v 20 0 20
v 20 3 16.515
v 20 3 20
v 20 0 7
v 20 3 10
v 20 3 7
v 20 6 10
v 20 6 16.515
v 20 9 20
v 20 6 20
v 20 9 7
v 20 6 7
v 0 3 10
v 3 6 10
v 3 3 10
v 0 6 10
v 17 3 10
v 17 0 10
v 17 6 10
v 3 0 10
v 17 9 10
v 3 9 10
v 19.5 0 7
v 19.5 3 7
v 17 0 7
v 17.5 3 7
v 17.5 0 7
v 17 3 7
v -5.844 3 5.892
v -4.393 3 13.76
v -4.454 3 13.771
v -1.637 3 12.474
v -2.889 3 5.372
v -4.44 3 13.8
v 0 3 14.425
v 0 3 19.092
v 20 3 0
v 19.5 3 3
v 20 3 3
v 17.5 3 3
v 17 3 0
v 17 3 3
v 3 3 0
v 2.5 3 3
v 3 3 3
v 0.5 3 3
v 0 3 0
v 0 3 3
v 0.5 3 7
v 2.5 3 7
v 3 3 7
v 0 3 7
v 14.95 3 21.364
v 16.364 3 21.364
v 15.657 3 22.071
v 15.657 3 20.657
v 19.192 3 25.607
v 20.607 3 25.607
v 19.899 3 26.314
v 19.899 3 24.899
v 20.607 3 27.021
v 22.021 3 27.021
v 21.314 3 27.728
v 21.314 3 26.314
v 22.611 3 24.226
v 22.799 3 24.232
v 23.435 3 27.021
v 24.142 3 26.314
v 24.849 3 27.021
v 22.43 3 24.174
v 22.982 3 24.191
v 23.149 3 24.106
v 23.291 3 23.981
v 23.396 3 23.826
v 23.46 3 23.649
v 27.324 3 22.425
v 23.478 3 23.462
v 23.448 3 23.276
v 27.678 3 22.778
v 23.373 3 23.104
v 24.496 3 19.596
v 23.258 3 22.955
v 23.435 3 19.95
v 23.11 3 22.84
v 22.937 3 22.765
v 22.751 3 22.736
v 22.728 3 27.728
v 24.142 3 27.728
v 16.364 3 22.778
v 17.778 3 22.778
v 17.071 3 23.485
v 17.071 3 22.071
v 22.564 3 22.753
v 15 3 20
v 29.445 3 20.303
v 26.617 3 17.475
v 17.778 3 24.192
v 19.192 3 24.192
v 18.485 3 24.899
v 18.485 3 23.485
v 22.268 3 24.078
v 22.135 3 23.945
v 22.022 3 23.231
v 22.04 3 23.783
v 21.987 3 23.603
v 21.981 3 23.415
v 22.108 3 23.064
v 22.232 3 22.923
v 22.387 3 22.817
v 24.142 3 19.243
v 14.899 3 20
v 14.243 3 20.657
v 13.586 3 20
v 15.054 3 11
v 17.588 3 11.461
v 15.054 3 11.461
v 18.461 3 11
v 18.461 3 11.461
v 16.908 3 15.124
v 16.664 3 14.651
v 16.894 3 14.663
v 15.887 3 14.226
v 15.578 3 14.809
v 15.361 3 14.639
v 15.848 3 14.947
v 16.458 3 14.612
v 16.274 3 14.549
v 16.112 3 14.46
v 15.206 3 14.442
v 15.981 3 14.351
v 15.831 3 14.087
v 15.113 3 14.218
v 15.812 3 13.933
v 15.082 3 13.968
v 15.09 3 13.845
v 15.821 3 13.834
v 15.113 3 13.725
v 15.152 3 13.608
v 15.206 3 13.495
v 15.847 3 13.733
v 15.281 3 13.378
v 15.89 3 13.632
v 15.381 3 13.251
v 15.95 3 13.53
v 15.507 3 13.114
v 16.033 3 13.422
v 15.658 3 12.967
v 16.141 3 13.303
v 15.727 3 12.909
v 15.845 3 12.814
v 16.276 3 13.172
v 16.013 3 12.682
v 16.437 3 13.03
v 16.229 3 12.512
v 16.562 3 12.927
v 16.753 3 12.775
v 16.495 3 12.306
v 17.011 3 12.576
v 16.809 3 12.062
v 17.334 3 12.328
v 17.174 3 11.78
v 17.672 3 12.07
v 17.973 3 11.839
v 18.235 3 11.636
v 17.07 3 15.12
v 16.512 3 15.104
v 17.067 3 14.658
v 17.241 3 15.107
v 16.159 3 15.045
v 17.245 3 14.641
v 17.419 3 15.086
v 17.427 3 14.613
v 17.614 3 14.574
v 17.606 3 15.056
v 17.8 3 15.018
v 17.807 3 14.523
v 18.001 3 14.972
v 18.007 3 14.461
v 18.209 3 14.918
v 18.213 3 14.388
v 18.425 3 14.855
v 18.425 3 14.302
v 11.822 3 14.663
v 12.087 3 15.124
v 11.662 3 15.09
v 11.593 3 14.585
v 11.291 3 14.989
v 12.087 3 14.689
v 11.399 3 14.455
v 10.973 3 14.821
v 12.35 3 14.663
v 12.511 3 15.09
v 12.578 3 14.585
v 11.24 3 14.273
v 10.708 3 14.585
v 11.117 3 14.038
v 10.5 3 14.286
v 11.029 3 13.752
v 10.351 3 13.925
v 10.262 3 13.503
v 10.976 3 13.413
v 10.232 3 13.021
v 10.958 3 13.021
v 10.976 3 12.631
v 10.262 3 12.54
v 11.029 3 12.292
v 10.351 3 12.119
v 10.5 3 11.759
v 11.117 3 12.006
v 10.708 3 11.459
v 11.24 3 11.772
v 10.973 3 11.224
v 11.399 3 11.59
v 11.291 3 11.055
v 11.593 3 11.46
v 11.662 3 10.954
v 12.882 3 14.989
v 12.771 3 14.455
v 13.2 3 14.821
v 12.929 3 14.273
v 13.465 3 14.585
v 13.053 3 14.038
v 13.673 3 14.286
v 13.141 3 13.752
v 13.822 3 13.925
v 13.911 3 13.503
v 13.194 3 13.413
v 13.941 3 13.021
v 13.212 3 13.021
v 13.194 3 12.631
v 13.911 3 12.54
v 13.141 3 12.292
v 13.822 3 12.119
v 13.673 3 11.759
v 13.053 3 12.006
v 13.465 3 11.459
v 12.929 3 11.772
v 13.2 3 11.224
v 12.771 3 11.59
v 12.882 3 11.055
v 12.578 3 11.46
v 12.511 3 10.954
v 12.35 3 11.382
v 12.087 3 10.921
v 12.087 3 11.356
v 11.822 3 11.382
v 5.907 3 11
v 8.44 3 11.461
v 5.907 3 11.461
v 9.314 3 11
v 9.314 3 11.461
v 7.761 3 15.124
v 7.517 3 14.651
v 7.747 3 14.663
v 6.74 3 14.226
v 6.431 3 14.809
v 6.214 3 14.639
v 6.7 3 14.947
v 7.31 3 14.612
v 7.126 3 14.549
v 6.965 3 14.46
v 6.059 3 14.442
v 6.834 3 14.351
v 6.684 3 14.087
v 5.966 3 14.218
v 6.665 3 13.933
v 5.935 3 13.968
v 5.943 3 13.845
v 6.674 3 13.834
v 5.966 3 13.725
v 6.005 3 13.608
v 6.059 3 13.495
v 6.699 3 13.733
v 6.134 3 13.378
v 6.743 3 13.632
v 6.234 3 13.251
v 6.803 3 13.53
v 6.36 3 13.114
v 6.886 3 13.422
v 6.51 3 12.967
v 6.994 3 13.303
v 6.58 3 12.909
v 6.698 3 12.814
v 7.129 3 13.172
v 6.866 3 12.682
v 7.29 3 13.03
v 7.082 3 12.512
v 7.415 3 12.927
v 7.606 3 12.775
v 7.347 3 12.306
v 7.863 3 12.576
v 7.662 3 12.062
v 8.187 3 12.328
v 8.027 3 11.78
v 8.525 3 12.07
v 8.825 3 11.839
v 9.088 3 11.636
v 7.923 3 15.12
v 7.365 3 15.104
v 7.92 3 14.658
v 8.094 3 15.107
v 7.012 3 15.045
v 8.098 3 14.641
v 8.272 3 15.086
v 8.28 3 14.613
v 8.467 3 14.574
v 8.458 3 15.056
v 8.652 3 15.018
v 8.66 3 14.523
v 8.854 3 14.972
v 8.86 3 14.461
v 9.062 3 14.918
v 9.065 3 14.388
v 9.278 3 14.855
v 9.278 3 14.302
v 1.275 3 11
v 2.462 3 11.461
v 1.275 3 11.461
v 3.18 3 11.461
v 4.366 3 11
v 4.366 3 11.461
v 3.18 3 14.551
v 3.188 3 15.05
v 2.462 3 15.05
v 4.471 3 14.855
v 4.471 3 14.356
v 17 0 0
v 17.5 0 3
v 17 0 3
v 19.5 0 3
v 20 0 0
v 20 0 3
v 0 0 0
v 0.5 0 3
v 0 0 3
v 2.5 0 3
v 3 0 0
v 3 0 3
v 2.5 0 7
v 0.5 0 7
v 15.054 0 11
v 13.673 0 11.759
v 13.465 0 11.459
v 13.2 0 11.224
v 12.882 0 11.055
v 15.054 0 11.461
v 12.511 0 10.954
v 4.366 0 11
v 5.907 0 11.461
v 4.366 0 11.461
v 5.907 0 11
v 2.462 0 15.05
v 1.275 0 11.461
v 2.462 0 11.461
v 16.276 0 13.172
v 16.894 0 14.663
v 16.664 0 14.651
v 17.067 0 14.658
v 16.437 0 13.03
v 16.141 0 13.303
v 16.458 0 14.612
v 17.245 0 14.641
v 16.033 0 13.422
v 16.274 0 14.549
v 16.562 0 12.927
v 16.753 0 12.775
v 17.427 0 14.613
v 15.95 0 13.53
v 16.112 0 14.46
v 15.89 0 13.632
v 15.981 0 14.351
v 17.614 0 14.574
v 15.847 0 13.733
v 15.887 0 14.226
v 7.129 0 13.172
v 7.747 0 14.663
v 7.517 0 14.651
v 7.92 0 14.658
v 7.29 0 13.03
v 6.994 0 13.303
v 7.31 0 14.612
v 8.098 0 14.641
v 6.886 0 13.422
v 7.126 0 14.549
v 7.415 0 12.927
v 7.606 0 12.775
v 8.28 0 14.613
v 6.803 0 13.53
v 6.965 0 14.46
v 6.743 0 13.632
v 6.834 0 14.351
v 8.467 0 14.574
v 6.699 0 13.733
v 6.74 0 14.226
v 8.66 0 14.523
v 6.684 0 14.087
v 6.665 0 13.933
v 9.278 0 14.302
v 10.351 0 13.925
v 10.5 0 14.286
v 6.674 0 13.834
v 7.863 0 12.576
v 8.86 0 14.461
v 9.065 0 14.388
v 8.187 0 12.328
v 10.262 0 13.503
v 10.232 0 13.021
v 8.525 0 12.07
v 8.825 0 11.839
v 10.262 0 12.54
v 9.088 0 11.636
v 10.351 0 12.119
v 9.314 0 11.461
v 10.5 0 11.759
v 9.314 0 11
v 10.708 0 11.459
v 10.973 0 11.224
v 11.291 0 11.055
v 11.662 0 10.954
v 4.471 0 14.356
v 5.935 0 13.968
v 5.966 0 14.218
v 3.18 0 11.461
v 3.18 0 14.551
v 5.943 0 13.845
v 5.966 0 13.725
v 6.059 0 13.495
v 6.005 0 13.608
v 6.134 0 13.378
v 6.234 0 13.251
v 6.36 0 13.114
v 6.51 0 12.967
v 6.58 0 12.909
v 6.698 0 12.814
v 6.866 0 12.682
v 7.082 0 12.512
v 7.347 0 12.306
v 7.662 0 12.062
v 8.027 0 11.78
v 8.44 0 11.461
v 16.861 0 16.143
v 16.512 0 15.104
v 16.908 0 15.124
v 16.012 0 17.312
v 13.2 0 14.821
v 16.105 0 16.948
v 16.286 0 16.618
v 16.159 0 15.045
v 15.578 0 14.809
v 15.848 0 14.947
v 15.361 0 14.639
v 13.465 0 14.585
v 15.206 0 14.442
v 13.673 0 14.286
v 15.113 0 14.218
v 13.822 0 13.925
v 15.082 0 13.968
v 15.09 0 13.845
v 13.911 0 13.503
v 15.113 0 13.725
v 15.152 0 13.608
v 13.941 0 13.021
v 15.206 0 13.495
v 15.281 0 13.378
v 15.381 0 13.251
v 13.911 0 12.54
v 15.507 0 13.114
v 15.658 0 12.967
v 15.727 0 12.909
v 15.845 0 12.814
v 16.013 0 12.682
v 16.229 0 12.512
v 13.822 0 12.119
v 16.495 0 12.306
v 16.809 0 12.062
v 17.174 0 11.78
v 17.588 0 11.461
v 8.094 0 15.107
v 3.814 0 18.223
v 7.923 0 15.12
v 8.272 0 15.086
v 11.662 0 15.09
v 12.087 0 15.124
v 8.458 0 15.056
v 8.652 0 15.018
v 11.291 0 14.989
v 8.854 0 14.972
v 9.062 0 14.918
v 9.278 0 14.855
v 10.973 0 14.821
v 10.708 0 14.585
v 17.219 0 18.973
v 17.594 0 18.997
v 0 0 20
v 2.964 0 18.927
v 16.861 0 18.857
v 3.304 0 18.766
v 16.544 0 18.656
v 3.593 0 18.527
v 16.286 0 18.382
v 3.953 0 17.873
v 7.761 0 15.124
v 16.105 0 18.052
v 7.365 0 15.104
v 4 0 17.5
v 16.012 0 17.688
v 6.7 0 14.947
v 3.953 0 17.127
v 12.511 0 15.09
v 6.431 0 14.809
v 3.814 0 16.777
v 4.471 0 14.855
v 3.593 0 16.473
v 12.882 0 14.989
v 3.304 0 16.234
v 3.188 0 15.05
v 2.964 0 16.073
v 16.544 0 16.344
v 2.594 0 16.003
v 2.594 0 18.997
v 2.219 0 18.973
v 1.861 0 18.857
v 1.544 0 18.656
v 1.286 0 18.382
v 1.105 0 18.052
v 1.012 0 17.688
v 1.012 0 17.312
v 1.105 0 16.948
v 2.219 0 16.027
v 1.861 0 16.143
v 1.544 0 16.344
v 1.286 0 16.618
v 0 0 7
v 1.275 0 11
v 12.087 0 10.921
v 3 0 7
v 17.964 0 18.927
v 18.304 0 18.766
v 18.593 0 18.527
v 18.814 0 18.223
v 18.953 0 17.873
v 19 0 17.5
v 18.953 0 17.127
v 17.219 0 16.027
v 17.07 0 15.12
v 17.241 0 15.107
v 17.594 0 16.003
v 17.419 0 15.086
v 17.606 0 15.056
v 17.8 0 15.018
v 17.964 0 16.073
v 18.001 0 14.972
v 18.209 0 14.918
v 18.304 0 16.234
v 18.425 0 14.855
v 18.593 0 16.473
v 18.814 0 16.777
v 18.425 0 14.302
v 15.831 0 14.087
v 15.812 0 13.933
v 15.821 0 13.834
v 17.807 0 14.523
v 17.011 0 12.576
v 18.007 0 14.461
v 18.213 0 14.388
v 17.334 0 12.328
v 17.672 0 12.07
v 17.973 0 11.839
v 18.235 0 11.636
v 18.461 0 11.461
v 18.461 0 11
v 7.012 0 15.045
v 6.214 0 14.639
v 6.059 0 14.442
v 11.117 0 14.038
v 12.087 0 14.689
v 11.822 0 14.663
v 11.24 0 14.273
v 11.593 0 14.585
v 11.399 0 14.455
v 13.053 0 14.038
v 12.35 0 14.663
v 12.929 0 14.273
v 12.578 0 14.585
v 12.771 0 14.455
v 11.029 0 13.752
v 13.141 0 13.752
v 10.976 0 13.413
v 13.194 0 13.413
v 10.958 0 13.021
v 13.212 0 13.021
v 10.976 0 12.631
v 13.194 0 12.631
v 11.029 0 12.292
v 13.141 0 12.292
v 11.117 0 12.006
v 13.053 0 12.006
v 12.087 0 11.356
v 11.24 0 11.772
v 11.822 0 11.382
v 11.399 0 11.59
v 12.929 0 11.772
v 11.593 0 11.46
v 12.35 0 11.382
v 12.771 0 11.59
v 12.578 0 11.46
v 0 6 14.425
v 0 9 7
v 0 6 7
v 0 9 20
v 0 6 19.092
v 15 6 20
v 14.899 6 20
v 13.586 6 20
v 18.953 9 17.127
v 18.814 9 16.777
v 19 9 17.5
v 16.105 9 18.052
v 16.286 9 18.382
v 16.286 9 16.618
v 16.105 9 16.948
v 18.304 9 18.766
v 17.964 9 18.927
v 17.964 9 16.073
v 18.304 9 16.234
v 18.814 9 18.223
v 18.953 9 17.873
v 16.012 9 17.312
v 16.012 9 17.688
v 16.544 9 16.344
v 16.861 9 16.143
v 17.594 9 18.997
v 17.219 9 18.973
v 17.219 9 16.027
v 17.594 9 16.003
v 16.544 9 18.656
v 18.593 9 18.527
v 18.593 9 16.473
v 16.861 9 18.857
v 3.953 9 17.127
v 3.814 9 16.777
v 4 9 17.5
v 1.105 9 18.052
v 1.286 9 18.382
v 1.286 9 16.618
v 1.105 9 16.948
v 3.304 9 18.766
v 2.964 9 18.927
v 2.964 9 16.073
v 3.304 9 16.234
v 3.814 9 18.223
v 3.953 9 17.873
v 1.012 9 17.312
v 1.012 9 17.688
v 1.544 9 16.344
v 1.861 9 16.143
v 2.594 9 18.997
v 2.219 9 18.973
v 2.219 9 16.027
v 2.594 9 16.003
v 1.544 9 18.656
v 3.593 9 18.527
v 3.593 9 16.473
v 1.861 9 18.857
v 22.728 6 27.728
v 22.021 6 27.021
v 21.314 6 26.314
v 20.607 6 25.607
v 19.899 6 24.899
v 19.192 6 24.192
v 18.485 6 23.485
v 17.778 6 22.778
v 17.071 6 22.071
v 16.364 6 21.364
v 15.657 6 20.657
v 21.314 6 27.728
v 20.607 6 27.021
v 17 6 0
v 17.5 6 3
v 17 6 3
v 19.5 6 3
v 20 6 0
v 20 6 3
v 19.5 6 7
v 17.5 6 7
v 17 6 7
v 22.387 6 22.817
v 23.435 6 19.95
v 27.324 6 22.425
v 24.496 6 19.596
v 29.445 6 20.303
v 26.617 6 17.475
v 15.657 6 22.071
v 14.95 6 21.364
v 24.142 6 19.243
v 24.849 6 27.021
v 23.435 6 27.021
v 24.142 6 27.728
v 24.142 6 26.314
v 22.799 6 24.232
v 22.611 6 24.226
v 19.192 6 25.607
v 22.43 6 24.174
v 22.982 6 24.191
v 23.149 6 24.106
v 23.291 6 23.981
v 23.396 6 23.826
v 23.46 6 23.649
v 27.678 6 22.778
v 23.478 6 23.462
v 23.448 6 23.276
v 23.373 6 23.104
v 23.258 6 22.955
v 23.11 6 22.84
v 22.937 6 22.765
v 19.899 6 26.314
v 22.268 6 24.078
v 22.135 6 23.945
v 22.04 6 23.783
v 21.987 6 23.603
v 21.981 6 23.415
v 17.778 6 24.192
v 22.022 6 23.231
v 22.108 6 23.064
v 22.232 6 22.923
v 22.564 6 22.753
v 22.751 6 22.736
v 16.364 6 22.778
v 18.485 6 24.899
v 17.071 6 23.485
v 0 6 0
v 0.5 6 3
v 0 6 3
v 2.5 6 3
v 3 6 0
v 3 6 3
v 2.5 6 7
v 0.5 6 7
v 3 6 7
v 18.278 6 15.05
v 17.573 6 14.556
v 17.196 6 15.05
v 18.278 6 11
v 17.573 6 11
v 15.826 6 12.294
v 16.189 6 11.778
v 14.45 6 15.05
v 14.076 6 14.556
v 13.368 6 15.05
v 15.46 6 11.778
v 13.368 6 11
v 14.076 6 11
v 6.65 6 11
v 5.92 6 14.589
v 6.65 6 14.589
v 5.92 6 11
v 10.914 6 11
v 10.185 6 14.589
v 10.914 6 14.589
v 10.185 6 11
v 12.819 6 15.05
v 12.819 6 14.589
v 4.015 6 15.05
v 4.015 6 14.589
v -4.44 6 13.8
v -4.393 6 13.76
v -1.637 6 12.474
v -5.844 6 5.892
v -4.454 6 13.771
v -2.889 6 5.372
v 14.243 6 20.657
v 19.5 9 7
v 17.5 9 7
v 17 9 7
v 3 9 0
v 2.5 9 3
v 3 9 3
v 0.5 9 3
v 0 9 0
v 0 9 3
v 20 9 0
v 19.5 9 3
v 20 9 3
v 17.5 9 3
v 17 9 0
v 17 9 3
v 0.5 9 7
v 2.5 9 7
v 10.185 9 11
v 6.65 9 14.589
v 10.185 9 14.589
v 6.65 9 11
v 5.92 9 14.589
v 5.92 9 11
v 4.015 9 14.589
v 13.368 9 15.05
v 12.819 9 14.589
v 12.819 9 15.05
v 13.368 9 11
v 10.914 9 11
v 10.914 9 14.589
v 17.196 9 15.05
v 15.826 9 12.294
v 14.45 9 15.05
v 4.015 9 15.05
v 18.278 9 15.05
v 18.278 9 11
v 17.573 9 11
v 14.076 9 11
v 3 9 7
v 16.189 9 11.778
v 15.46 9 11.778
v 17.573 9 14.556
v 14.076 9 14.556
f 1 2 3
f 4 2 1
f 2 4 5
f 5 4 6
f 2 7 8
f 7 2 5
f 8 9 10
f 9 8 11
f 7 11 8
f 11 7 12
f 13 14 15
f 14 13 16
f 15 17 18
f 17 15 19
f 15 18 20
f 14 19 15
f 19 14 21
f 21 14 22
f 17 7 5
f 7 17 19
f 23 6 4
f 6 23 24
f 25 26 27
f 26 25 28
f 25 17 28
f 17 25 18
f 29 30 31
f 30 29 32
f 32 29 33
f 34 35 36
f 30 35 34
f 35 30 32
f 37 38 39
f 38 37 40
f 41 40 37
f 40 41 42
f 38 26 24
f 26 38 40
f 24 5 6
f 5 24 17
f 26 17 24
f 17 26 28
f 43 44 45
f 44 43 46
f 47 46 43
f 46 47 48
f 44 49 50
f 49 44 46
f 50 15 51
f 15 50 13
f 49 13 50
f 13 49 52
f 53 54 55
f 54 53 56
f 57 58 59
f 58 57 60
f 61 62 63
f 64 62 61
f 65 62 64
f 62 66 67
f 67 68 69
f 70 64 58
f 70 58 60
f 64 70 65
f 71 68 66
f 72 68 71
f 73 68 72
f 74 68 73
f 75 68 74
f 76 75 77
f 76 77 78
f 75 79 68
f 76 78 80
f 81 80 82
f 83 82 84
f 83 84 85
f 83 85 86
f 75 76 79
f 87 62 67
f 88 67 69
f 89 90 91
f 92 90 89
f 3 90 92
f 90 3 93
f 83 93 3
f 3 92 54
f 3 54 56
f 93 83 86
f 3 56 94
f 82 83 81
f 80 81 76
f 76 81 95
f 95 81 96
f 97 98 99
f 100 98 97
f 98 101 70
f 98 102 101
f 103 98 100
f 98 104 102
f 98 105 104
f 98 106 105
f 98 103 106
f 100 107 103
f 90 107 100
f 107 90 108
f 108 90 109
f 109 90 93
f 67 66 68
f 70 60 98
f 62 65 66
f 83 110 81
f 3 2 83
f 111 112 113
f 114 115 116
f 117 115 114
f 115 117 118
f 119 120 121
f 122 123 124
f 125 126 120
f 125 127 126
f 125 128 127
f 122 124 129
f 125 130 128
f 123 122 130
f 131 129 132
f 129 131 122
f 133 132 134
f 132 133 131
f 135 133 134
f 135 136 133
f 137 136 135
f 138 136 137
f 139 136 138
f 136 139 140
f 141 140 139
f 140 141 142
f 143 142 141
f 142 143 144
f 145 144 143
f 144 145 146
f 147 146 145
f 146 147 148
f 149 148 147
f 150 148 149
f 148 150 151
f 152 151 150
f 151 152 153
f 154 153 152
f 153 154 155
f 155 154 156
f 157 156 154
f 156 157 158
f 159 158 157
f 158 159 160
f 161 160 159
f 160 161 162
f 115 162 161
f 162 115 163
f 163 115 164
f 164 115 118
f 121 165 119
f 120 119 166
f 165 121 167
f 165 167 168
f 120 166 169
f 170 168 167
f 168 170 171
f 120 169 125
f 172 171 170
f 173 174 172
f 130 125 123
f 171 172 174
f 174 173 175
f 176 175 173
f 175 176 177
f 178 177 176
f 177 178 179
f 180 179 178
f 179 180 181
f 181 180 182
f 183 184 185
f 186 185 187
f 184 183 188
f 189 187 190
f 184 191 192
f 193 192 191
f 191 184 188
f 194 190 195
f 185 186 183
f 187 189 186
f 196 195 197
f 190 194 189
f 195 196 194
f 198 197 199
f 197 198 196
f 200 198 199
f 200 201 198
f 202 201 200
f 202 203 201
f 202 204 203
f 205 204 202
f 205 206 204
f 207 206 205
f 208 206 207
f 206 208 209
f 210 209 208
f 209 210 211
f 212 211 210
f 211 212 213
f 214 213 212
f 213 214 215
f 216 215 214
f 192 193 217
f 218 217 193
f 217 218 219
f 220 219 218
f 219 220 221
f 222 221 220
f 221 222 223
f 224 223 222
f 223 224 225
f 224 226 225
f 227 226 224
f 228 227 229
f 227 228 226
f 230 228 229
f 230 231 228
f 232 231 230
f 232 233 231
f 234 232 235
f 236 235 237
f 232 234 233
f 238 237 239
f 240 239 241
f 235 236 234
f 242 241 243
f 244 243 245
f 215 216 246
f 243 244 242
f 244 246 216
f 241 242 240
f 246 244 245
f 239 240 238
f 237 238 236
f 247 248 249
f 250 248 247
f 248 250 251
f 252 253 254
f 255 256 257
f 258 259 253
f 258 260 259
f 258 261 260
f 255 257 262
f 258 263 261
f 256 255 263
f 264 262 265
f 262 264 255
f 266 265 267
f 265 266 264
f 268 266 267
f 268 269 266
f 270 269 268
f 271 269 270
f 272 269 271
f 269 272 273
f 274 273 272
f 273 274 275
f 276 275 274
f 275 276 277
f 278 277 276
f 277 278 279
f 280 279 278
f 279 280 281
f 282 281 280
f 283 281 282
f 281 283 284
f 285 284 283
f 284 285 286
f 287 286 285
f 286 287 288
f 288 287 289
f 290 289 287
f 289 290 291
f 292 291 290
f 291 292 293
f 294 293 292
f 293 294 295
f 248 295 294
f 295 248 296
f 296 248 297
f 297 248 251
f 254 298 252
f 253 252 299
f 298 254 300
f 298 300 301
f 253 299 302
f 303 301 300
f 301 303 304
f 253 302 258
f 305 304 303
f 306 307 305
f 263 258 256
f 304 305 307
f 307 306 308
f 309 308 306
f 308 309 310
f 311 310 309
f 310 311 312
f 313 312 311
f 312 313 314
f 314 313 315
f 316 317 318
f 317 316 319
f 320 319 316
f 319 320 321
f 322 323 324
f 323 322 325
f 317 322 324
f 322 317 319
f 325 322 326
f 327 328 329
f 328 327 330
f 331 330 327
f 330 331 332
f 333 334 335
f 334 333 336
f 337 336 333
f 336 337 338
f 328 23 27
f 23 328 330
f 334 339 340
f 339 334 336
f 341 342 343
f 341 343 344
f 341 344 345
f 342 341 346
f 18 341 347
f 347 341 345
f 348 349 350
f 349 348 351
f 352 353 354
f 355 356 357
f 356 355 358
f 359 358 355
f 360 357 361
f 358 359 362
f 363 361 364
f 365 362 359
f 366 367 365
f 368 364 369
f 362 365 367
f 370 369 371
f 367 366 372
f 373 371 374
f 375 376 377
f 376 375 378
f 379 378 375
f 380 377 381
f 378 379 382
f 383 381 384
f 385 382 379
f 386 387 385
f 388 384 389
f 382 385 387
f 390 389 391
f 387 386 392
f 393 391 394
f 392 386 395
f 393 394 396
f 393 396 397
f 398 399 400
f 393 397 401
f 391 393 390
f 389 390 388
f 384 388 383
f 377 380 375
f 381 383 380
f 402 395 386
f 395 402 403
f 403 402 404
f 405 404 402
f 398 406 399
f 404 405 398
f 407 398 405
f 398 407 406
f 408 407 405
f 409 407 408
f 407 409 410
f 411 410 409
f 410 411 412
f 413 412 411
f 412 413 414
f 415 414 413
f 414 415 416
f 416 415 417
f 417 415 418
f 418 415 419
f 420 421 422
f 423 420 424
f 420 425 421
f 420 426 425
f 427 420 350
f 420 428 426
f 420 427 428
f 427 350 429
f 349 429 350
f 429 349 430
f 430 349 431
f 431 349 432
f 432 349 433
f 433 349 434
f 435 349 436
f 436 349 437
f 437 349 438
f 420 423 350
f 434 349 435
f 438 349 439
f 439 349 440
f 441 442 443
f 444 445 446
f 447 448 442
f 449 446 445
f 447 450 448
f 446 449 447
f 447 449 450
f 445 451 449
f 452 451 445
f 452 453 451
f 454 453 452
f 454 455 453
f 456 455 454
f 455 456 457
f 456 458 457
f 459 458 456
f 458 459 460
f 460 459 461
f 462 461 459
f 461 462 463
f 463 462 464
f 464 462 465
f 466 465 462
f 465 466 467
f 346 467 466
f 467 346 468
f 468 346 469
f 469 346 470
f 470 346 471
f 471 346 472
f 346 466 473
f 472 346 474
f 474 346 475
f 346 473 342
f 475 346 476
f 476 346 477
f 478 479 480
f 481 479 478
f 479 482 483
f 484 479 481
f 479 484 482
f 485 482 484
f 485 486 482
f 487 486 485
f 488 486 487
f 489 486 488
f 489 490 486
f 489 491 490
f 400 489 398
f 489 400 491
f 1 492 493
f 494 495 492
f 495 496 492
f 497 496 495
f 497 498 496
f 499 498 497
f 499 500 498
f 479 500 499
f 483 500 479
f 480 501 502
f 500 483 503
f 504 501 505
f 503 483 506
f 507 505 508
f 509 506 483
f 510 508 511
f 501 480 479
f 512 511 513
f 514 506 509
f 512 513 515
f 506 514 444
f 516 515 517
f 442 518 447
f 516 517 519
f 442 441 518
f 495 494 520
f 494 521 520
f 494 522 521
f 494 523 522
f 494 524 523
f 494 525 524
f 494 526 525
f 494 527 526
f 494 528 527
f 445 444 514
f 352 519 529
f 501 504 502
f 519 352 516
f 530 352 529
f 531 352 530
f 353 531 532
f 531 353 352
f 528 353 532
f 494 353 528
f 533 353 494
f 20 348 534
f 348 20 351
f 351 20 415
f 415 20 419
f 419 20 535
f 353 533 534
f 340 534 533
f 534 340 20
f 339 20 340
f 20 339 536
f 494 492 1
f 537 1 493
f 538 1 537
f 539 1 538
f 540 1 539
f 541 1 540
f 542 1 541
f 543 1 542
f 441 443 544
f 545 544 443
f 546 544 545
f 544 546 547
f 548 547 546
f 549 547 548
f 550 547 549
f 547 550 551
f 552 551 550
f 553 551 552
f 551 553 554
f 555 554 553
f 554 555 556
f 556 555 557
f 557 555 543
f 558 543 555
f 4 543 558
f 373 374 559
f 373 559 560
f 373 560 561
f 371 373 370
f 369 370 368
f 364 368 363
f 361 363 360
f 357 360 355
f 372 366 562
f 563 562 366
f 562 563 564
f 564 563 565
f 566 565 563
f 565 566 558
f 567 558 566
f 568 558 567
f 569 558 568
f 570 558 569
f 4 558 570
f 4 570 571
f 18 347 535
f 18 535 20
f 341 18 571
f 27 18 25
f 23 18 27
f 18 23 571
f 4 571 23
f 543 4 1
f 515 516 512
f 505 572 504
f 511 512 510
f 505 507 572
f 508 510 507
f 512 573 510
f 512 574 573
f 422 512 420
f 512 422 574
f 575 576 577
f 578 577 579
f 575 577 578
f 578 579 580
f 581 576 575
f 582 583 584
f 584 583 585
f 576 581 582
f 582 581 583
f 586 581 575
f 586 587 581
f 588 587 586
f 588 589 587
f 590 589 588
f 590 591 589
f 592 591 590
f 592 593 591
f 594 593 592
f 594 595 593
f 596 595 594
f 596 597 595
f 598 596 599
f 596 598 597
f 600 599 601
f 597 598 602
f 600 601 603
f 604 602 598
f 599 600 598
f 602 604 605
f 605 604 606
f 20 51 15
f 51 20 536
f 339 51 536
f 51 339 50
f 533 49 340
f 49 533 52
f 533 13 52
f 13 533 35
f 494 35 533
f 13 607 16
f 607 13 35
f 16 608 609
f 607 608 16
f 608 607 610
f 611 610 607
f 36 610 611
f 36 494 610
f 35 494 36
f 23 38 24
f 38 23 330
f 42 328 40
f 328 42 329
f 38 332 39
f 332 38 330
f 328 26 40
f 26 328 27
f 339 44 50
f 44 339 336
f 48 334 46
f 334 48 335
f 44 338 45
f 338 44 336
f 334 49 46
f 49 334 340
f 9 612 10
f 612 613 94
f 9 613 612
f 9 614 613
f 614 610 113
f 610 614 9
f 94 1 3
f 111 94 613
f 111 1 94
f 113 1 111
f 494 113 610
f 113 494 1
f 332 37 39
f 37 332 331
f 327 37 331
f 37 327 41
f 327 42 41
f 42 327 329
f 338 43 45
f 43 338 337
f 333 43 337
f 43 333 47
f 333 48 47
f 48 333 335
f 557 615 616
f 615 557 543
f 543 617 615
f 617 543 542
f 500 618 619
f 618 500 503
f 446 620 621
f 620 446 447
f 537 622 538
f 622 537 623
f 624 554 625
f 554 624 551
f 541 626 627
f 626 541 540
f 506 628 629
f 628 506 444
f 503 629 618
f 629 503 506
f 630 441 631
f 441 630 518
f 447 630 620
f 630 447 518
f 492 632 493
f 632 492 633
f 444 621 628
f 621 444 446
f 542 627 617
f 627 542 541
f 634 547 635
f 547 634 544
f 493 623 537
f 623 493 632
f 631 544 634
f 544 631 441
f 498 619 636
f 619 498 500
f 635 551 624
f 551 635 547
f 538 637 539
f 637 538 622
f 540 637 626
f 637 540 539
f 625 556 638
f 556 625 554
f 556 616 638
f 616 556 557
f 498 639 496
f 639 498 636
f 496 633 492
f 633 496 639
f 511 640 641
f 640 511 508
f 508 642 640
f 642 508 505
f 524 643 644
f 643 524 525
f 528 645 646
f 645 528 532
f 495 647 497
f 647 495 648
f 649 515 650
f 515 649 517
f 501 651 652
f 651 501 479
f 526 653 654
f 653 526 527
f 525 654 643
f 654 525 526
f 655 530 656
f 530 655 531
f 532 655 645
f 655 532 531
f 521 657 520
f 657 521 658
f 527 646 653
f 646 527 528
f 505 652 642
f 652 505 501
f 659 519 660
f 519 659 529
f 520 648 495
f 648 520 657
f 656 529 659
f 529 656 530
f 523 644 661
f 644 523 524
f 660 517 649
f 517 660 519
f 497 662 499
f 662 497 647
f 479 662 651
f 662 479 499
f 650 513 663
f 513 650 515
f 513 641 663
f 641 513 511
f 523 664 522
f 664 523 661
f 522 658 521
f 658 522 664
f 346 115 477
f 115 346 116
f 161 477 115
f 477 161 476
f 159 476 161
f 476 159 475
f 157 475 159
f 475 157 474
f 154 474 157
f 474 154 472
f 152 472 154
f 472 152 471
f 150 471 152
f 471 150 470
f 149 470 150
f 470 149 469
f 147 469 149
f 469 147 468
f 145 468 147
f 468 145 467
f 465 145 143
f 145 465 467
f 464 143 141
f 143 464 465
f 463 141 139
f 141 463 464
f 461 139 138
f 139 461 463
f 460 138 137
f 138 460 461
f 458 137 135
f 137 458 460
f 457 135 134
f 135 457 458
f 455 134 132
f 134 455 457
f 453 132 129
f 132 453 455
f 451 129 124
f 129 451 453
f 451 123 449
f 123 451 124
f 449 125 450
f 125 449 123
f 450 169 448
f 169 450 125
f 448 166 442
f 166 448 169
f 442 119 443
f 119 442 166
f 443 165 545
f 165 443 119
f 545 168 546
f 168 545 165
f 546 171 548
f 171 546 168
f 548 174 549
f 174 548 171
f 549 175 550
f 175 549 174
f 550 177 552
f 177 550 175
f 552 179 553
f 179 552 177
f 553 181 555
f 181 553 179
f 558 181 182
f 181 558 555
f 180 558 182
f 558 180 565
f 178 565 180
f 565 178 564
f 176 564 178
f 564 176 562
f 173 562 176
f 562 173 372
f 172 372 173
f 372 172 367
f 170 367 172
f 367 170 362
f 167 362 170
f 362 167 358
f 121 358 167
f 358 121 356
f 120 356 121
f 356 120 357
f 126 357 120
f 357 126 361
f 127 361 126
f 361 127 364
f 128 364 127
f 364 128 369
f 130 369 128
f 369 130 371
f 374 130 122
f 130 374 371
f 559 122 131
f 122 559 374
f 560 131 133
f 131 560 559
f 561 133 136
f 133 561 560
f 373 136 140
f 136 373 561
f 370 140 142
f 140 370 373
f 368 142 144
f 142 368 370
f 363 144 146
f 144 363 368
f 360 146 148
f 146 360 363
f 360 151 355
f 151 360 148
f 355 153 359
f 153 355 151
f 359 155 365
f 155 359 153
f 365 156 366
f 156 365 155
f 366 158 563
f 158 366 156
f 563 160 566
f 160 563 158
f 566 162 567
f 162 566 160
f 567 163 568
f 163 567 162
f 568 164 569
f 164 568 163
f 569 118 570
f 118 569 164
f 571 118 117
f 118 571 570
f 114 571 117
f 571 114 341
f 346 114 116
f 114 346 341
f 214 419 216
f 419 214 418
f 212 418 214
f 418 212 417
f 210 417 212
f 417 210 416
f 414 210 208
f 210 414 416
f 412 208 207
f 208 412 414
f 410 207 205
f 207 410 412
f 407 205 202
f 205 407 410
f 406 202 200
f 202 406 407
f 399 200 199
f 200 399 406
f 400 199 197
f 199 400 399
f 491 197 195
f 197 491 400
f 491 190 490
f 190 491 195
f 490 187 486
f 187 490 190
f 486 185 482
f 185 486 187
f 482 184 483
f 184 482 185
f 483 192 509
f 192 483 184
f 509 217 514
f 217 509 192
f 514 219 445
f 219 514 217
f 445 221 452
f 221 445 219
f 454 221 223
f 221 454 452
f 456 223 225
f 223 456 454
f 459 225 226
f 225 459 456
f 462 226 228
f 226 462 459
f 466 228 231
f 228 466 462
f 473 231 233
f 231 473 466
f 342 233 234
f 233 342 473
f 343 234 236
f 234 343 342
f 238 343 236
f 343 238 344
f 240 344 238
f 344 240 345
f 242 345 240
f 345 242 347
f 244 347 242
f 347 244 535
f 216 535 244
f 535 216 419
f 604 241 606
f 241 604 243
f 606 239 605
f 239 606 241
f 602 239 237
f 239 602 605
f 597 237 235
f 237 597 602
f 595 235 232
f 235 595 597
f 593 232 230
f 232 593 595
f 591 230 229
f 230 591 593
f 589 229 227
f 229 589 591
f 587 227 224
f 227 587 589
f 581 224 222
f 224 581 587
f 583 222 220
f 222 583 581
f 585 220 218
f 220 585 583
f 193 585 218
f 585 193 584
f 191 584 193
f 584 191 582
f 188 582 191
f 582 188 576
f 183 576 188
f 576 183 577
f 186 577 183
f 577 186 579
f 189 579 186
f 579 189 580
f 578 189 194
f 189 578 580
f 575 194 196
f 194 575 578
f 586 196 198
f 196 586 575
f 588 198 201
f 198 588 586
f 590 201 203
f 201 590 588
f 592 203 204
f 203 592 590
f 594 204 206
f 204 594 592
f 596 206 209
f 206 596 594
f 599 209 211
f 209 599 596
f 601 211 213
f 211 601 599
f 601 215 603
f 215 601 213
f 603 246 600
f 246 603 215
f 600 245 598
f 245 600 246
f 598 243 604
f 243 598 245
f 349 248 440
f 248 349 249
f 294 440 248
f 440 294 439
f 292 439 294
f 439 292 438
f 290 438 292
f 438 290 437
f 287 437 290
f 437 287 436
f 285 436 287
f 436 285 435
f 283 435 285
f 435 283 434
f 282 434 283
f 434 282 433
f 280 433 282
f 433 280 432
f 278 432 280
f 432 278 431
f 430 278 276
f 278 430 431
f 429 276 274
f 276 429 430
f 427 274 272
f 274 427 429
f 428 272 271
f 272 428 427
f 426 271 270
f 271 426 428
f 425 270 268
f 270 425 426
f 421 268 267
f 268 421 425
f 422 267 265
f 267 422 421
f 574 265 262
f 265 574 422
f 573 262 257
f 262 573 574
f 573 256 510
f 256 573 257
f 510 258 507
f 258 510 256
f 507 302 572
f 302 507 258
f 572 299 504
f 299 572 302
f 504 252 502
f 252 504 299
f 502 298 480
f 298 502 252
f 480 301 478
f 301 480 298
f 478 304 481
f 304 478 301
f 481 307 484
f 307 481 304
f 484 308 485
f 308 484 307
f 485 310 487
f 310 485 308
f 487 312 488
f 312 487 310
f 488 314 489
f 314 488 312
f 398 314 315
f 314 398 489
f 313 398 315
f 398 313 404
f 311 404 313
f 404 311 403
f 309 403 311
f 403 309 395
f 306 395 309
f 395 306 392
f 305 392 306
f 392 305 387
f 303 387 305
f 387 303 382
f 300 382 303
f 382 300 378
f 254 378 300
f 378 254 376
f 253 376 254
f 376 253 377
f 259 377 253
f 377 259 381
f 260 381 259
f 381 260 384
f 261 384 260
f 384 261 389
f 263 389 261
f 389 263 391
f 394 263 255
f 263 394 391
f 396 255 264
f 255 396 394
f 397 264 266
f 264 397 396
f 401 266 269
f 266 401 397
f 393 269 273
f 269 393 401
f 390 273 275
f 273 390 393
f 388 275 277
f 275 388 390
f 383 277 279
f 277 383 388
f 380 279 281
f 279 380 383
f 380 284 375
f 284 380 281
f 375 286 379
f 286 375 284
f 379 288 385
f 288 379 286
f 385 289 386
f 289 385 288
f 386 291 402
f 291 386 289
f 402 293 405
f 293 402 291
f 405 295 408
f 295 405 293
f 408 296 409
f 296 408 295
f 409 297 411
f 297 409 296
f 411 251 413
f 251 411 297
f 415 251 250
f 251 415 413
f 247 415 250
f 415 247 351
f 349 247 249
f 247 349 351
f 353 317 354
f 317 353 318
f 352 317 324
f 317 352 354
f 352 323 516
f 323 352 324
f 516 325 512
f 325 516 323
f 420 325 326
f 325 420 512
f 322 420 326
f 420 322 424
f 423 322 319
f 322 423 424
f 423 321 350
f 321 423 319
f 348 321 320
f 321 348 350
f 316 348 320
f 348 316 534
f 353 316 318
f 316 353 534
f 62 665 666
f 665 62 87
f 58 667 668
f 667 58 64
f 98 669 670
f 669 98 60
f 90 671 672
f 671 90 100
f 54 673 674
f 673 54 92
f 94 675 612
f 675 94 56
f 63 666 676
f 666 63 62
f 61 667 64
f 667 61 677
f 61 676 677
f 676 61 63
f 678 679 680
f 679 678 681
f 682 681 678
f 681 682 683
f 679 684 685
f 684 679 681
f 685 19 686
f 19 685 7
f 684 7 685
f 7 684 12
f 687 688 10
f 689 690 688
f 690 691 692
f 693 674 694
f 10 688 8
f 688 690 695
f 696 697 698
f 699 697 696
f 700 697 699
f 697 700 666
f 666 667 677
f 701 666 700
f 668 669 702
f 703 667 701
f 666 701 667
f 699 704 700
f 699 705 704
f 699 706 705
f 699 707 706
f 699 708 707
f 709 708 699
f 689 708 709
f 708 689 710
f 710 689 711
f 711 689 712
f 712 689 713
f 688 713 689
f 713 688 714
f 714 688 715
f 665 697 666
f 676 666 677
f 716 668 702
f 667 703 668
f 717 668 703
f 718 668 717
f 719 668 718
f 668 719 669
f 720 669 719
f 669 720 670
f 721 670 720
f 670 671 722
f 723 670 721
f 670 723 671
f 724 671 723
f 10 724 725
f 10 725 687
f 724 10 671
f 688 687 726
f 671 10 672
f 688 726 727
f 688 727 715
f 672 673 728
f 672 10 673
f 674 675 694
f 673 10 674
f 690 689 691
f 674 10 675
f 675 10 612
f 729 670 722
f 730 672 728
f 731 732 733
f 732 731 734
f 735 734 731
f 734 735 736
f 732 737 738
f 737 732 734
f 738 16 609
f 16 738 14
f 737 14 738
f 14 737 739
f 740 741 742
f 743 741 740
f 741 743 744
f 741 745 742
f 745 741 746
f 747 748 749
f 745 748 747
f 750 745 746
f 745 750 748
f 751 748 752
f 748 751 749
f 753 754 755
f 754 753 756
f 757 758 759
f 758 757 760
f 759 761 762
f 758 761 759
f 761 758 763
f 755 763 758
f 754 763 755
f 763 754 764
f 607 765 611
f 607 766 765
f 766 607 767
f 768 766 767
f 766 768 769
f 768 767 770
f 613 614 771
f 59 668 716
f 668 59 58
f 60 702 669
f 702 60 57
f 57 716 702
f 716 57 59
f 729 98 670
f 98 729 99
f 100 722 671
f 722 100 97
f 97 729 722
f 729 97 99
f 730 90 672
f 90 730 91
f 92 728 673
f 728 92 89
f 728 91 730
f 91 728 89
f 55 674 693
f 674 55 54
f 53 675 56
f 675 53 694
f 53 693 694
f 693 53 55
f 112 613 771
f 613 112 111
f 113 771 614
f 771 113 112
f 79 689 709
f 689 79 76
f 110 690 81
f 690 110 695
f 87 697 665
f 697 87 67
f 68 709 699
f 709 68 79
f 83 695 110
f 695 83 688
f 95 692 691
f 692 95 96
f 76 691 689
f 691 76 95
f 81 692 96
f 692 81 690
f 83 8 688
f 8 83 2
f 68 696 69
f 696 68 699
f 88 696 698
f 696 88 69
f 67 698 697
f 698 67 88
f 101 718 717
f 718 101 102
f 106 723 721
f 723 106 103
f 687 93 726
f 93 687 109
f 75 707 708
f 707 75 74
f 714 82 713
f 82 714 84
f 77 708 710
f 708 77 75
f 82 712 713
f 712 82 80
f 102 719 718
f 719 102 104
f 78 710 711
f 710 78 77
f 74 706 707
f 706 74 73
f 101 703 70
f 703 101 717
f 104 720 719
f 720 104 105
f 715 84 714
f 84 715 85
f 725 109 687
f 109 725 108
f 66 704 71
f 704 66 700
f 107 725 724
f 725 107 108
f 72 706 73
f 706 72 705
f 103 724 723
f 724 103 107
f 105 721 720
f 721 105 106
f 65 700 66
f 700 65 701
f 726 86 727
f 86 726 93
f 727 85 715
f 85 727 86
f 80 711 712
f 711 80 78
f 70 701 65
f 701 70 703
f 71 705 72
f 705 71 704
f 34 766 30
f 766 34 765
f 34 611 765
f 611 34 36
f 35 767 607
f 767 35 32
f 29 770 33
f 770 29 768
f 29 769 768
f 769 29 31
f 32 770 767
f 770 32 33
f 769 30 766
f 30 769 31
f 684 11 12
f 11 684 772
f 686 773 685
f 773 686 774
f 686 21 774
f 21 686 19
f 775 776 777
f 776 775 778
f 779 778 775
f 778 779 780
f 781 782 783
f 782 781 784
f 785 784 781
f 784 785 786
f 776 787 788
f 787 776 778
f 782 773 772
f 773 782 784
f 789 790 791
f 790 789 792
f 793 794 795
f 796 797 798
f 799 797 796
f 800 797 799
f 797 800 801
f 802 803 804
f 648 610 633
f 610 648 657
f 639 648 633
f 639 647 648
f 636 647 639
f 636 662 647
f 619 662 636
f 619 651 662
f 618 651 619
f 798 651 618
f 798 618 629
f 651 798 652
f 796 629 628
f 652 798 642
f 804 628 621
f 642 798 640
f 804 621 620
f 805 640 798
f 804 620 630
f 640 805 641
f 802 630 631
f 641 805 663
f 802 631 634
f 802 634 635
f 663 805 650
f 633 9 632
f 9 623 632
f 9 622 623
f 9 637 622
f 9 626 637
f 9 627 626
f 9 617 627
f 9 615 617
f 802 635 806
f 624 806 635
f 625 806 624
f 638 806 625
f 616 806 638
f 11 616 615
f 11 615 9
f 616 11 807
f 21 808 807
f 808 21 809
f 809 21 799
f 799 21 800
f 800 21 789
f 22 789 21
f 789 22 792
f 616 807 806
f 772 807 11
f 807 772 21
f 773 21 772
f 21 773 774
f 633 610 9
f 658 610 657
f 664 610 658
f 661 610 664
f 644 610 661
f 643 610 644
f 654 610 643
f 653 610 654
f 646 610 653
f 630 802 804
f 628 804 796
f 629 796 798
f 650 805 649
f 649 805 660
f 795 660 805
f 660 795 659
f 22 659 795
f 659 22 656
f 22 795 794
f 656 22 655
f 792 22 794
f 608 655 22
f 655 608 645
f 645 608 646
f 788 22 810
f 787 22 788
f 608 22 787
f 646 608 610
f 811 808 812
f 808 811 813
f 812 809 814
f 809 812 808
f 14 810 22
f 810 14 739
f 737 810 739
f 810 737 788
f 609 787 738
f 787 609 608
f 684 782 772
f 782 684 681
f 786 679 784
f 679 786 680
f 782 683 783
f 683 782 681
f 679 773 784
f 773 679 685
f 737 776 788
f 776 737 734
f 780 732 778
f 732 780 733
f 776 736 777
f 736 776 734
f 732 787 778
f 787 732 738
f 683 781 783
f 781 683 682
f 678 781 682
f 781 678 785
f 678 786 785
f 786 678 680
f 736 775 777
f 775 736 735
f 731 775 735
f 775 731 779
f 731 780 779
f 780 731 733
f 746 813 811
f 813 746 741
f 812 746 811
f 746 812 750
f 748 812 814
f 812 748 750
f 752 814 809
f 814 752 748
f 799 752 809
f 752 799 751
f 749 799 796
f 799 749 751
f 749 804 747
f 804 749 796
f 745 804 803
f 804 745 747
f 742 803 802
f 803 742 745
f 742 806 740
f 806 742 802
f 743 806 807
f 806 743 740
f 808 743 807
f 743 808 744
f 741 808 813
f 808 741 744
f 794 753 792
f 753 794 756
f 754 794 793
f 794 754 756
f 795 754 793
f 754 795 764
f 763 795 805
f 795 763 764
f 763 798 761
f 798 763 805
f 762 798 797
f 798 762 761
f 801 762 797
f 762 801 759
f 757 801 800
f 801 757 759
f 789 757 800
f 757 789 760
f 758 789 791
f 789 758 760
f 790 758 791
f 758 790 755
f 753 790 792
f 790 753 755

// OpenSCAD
// file: ../gospel.scad
/**
 * GOSPEL: George's OpenSCAD Procedural Enhancement Library
 * @author glaza
 *
 * Index:
 *      Translation: x, y, z, xy, xz, yz, xyz (displacement, variation)
 *      Scaling:     sx, sy, sz, sxy, sxz, syz, s (factor, variation)
 *      Rotation:    rx, ry, rz (angle, variation)
 *      Duplication: dx, dy, dz ()
 */

/**
 * Translates the children in the X,Y,Z direction
 * @param d Displacement in X,Y,Z direction
 * @param variation The random variation + or - added to the displacement * 
 *  x      Translate X
 *  y      Translate Y
 *  z      Translate Z
 *  xy     Translate equaly in X and Y
 *  xz     Translate equaly in X and Z
 *  yz     Translate equaly in Y and Z
 *  xyz    Translate equaly in X, Y and Z
 */
function rand(value, variation=0) = value + rands(-variation,variation,1)[0]; 
 
module x(dx, variation=0) 
{   
    vx = rands(-variation,variation,1)[0];
    translate([dx+vx,0,0])
    children();
}
module y(dy, variation=0) 
{   
    vy = rands(-variation,variation,1)[0];
    translate([0,dy+vy,0])
    children();
} 
module z(dz, variation=0) 
{   
    vz = rands(-variation,variation,1)[0];
    translate([0,0,dz+vz])
    children();
}
module xy(d, variation=0) 
{   
    x(d, variation)
    y(d, variation)
    children();
}
module yz(d, variation=0) 
{   
    z(d, variation)
    y(d, variation)
    children();
}
module xz(d, variation=0) 
{   
    x(d, variation)
    z(d, variation)
    children();
}
module xyz(d, variation=0) 
{   
    xy(d, variation)
    z(d, variation)
    children();
}

/**
 * Rotates the children around the X axis
 * @param angle Degrees to rotate around the X axis
 * @param variation The random variation + or - added
 *  rx     Rotate around X
 *  ry     Rotate around Y
 *  rz     Rotate around Z
 */
module rx(angle, variation=0) 
{   
    v = rands(-variation,variation,1)[0];
    rotate([angle+v,0,0])
    children();
}
module ry(angle, variation=0) 
{   
    v = rands(-variation,variation,1)[0];
    rotate([0,angle+v,0])
    children();
}
module rz(angle, variation=0) 
{   
    v = rands(-variation,variation,1)[0];
    rotate([0,0,angle+v])
    children();
}

/**
 * Duplicates the children across the different planes.
 *      dx: YZ plane, dy: XZ plane, dz: XY plane
 */
module dx() 
{
    mirror([1,0,0])
    children();

    children();
}
module dy() 
{
    mirror([0,1,0])
    children();

    children();
}
module dz() 
{
    mirror([0,0,1])
    children();

    children();
}

/**
 * Mirrors across diferent planes.
 *      mx: YZ plane, my: XZ plane, mz: XY plane
 */
module mx() 
{
    mirror([1,0,0])
    children();
}
module my() 
{
    mirror([0,1,0])
    children();
}
module mz() 
{
    mirror([0,0,1])
    children();
}

/**
 * Scales in different directions
 *      mx: YZ plane, my: XZ plane, mz: XY plane
 */
module sx(factor, variation=0) 
{
    scaleFactor = rand(factor, variation);
    scale([scaleFactor,1,1])
    children();
}
module sy(factor, variation=0) 
{
    scaleFactor = rand(factor, variation);
    scale([1,scaleFactor,1])
    children();
}
module sz(factor, variation=0) 
{
    scaleFactor = rand(factor, variation);
    scale([1,1,scaleFactor])
    children();
}
module sxy(factor, variation=0) 
{
    sx(factor, variation)
    sy(factor, variation)
    children();
}
module syz(factor, variation=0) 
{
    sz(factor, variation)
    sy(factor, variation)
    children();
}
module sxz(factor, variation=0) 
{   
    sx(factor, variation)
    sz(factor, variation)
    children();
}
module s(factor, variation=0) 
{   
    sxy(factor, variation)
    sz(factor, variation)
    children();
}

/**
 * Shortcuts
 */
module diff() //does not work
{
    difference()
    {
        children();
    }
}


/**
 * Colours
 */
module red()
{
    color("Red")
    children();
}
module blue()
{
    color("RoyalBlue")
    children();
}
module black()
{
    color("Black")
    children();
}
module white()
{
    color("White")
    children();
}

/**
 * shapes
 * @param size A vector passed to the cube
 * @param r The radius of the sphere
 * @param half Whether all corners or only top ones
 */
module rounded(size, r, half)
{
    radius = half
        ? min(r, 0.999*min(size[0]/2, size[1]/2, size[2]))
        : min(r, 0.999*min(size)/2);
    
    diameter = 2*radius;
    width = size[0] - diameter;
    height = size[1] - diameter;
    depth = half 
        ? (size[2] - radius) 
        : size[2] - diameter;
    shift = half ? radius : 0; 
    
    intersection()
    {
        z(-shift)
        xyz(radius)
        minkowski()
        {
            sphere(radius);
            cube([width,height,depth]);
        }
        
        cube(size);
    }
}
// main file
use <../gospel.scad>

$fn=25;

horse();

module horse() {
    color("#FFFFFF80")
    leg("2021");
    y(3) body();
    y(6) leg("MTT");
}

module pins(scale = 1.0) {
    z(17.5) {
        x(17.5) rx(-90) sxy(scale) cylinder(d=3, h=9);
        x(2.5) rx(-90) sxy(scale) cylinder(d=3, h=9);
    }
}

module body() {
    
    difference() {
        union() {
            // Body
            z(10) cube([20, 3, 10]);
            
            // Head
            x(10) z(15) ry(45) {
                difference() {
                    union() {
                        // Noze
                        z(13) cube([7, 3, 5]);
                        z(13.5) cube([10, 3, 4]);
                        // Neck
                        z(3) cube([6, 3, 15]);
                        // Eyebrow
                        x(1) z(18) cube([1, 3, 1]);
                        
                           
                        // Hair
                        for (i = [0:5]) {
                            x(-1) z(16-2*i) cube([1, 3, 1]);
                        }
                    }
                    // Eye
                    x(3) z(15) rx(-90) cylinder(d=1.5, h=9);
                }
            }
            
            // Tail
            x(3) z(18) ry(-140) cube([3, 3, 8]);
            x(-1.5) z(13.25) ry(-170) cube([3, 3, 8]);
        }
        pins();
    }
}

module leg(string="2021") {
    difference() {
        union() {
            z(10) cube([20, 3, 10]);
            
            x(17) cube([3, 3, 3]);
            cube([3, 3, 3]);
            
            z(7) {
                x(17) cube([3, 3, 3]);
                cube([3, 3, 3]);
            }

            x(0.5) z(3) {
                x(17) cube([2, 3, 4]);
                cube([2, 3, 4]);
            }
        }
        pins();
        x(19) z(11) sx(1.325) rz(180) rx(90) linear_extrude(3) text(string, size=4, font="Arial Black");
    }
}
